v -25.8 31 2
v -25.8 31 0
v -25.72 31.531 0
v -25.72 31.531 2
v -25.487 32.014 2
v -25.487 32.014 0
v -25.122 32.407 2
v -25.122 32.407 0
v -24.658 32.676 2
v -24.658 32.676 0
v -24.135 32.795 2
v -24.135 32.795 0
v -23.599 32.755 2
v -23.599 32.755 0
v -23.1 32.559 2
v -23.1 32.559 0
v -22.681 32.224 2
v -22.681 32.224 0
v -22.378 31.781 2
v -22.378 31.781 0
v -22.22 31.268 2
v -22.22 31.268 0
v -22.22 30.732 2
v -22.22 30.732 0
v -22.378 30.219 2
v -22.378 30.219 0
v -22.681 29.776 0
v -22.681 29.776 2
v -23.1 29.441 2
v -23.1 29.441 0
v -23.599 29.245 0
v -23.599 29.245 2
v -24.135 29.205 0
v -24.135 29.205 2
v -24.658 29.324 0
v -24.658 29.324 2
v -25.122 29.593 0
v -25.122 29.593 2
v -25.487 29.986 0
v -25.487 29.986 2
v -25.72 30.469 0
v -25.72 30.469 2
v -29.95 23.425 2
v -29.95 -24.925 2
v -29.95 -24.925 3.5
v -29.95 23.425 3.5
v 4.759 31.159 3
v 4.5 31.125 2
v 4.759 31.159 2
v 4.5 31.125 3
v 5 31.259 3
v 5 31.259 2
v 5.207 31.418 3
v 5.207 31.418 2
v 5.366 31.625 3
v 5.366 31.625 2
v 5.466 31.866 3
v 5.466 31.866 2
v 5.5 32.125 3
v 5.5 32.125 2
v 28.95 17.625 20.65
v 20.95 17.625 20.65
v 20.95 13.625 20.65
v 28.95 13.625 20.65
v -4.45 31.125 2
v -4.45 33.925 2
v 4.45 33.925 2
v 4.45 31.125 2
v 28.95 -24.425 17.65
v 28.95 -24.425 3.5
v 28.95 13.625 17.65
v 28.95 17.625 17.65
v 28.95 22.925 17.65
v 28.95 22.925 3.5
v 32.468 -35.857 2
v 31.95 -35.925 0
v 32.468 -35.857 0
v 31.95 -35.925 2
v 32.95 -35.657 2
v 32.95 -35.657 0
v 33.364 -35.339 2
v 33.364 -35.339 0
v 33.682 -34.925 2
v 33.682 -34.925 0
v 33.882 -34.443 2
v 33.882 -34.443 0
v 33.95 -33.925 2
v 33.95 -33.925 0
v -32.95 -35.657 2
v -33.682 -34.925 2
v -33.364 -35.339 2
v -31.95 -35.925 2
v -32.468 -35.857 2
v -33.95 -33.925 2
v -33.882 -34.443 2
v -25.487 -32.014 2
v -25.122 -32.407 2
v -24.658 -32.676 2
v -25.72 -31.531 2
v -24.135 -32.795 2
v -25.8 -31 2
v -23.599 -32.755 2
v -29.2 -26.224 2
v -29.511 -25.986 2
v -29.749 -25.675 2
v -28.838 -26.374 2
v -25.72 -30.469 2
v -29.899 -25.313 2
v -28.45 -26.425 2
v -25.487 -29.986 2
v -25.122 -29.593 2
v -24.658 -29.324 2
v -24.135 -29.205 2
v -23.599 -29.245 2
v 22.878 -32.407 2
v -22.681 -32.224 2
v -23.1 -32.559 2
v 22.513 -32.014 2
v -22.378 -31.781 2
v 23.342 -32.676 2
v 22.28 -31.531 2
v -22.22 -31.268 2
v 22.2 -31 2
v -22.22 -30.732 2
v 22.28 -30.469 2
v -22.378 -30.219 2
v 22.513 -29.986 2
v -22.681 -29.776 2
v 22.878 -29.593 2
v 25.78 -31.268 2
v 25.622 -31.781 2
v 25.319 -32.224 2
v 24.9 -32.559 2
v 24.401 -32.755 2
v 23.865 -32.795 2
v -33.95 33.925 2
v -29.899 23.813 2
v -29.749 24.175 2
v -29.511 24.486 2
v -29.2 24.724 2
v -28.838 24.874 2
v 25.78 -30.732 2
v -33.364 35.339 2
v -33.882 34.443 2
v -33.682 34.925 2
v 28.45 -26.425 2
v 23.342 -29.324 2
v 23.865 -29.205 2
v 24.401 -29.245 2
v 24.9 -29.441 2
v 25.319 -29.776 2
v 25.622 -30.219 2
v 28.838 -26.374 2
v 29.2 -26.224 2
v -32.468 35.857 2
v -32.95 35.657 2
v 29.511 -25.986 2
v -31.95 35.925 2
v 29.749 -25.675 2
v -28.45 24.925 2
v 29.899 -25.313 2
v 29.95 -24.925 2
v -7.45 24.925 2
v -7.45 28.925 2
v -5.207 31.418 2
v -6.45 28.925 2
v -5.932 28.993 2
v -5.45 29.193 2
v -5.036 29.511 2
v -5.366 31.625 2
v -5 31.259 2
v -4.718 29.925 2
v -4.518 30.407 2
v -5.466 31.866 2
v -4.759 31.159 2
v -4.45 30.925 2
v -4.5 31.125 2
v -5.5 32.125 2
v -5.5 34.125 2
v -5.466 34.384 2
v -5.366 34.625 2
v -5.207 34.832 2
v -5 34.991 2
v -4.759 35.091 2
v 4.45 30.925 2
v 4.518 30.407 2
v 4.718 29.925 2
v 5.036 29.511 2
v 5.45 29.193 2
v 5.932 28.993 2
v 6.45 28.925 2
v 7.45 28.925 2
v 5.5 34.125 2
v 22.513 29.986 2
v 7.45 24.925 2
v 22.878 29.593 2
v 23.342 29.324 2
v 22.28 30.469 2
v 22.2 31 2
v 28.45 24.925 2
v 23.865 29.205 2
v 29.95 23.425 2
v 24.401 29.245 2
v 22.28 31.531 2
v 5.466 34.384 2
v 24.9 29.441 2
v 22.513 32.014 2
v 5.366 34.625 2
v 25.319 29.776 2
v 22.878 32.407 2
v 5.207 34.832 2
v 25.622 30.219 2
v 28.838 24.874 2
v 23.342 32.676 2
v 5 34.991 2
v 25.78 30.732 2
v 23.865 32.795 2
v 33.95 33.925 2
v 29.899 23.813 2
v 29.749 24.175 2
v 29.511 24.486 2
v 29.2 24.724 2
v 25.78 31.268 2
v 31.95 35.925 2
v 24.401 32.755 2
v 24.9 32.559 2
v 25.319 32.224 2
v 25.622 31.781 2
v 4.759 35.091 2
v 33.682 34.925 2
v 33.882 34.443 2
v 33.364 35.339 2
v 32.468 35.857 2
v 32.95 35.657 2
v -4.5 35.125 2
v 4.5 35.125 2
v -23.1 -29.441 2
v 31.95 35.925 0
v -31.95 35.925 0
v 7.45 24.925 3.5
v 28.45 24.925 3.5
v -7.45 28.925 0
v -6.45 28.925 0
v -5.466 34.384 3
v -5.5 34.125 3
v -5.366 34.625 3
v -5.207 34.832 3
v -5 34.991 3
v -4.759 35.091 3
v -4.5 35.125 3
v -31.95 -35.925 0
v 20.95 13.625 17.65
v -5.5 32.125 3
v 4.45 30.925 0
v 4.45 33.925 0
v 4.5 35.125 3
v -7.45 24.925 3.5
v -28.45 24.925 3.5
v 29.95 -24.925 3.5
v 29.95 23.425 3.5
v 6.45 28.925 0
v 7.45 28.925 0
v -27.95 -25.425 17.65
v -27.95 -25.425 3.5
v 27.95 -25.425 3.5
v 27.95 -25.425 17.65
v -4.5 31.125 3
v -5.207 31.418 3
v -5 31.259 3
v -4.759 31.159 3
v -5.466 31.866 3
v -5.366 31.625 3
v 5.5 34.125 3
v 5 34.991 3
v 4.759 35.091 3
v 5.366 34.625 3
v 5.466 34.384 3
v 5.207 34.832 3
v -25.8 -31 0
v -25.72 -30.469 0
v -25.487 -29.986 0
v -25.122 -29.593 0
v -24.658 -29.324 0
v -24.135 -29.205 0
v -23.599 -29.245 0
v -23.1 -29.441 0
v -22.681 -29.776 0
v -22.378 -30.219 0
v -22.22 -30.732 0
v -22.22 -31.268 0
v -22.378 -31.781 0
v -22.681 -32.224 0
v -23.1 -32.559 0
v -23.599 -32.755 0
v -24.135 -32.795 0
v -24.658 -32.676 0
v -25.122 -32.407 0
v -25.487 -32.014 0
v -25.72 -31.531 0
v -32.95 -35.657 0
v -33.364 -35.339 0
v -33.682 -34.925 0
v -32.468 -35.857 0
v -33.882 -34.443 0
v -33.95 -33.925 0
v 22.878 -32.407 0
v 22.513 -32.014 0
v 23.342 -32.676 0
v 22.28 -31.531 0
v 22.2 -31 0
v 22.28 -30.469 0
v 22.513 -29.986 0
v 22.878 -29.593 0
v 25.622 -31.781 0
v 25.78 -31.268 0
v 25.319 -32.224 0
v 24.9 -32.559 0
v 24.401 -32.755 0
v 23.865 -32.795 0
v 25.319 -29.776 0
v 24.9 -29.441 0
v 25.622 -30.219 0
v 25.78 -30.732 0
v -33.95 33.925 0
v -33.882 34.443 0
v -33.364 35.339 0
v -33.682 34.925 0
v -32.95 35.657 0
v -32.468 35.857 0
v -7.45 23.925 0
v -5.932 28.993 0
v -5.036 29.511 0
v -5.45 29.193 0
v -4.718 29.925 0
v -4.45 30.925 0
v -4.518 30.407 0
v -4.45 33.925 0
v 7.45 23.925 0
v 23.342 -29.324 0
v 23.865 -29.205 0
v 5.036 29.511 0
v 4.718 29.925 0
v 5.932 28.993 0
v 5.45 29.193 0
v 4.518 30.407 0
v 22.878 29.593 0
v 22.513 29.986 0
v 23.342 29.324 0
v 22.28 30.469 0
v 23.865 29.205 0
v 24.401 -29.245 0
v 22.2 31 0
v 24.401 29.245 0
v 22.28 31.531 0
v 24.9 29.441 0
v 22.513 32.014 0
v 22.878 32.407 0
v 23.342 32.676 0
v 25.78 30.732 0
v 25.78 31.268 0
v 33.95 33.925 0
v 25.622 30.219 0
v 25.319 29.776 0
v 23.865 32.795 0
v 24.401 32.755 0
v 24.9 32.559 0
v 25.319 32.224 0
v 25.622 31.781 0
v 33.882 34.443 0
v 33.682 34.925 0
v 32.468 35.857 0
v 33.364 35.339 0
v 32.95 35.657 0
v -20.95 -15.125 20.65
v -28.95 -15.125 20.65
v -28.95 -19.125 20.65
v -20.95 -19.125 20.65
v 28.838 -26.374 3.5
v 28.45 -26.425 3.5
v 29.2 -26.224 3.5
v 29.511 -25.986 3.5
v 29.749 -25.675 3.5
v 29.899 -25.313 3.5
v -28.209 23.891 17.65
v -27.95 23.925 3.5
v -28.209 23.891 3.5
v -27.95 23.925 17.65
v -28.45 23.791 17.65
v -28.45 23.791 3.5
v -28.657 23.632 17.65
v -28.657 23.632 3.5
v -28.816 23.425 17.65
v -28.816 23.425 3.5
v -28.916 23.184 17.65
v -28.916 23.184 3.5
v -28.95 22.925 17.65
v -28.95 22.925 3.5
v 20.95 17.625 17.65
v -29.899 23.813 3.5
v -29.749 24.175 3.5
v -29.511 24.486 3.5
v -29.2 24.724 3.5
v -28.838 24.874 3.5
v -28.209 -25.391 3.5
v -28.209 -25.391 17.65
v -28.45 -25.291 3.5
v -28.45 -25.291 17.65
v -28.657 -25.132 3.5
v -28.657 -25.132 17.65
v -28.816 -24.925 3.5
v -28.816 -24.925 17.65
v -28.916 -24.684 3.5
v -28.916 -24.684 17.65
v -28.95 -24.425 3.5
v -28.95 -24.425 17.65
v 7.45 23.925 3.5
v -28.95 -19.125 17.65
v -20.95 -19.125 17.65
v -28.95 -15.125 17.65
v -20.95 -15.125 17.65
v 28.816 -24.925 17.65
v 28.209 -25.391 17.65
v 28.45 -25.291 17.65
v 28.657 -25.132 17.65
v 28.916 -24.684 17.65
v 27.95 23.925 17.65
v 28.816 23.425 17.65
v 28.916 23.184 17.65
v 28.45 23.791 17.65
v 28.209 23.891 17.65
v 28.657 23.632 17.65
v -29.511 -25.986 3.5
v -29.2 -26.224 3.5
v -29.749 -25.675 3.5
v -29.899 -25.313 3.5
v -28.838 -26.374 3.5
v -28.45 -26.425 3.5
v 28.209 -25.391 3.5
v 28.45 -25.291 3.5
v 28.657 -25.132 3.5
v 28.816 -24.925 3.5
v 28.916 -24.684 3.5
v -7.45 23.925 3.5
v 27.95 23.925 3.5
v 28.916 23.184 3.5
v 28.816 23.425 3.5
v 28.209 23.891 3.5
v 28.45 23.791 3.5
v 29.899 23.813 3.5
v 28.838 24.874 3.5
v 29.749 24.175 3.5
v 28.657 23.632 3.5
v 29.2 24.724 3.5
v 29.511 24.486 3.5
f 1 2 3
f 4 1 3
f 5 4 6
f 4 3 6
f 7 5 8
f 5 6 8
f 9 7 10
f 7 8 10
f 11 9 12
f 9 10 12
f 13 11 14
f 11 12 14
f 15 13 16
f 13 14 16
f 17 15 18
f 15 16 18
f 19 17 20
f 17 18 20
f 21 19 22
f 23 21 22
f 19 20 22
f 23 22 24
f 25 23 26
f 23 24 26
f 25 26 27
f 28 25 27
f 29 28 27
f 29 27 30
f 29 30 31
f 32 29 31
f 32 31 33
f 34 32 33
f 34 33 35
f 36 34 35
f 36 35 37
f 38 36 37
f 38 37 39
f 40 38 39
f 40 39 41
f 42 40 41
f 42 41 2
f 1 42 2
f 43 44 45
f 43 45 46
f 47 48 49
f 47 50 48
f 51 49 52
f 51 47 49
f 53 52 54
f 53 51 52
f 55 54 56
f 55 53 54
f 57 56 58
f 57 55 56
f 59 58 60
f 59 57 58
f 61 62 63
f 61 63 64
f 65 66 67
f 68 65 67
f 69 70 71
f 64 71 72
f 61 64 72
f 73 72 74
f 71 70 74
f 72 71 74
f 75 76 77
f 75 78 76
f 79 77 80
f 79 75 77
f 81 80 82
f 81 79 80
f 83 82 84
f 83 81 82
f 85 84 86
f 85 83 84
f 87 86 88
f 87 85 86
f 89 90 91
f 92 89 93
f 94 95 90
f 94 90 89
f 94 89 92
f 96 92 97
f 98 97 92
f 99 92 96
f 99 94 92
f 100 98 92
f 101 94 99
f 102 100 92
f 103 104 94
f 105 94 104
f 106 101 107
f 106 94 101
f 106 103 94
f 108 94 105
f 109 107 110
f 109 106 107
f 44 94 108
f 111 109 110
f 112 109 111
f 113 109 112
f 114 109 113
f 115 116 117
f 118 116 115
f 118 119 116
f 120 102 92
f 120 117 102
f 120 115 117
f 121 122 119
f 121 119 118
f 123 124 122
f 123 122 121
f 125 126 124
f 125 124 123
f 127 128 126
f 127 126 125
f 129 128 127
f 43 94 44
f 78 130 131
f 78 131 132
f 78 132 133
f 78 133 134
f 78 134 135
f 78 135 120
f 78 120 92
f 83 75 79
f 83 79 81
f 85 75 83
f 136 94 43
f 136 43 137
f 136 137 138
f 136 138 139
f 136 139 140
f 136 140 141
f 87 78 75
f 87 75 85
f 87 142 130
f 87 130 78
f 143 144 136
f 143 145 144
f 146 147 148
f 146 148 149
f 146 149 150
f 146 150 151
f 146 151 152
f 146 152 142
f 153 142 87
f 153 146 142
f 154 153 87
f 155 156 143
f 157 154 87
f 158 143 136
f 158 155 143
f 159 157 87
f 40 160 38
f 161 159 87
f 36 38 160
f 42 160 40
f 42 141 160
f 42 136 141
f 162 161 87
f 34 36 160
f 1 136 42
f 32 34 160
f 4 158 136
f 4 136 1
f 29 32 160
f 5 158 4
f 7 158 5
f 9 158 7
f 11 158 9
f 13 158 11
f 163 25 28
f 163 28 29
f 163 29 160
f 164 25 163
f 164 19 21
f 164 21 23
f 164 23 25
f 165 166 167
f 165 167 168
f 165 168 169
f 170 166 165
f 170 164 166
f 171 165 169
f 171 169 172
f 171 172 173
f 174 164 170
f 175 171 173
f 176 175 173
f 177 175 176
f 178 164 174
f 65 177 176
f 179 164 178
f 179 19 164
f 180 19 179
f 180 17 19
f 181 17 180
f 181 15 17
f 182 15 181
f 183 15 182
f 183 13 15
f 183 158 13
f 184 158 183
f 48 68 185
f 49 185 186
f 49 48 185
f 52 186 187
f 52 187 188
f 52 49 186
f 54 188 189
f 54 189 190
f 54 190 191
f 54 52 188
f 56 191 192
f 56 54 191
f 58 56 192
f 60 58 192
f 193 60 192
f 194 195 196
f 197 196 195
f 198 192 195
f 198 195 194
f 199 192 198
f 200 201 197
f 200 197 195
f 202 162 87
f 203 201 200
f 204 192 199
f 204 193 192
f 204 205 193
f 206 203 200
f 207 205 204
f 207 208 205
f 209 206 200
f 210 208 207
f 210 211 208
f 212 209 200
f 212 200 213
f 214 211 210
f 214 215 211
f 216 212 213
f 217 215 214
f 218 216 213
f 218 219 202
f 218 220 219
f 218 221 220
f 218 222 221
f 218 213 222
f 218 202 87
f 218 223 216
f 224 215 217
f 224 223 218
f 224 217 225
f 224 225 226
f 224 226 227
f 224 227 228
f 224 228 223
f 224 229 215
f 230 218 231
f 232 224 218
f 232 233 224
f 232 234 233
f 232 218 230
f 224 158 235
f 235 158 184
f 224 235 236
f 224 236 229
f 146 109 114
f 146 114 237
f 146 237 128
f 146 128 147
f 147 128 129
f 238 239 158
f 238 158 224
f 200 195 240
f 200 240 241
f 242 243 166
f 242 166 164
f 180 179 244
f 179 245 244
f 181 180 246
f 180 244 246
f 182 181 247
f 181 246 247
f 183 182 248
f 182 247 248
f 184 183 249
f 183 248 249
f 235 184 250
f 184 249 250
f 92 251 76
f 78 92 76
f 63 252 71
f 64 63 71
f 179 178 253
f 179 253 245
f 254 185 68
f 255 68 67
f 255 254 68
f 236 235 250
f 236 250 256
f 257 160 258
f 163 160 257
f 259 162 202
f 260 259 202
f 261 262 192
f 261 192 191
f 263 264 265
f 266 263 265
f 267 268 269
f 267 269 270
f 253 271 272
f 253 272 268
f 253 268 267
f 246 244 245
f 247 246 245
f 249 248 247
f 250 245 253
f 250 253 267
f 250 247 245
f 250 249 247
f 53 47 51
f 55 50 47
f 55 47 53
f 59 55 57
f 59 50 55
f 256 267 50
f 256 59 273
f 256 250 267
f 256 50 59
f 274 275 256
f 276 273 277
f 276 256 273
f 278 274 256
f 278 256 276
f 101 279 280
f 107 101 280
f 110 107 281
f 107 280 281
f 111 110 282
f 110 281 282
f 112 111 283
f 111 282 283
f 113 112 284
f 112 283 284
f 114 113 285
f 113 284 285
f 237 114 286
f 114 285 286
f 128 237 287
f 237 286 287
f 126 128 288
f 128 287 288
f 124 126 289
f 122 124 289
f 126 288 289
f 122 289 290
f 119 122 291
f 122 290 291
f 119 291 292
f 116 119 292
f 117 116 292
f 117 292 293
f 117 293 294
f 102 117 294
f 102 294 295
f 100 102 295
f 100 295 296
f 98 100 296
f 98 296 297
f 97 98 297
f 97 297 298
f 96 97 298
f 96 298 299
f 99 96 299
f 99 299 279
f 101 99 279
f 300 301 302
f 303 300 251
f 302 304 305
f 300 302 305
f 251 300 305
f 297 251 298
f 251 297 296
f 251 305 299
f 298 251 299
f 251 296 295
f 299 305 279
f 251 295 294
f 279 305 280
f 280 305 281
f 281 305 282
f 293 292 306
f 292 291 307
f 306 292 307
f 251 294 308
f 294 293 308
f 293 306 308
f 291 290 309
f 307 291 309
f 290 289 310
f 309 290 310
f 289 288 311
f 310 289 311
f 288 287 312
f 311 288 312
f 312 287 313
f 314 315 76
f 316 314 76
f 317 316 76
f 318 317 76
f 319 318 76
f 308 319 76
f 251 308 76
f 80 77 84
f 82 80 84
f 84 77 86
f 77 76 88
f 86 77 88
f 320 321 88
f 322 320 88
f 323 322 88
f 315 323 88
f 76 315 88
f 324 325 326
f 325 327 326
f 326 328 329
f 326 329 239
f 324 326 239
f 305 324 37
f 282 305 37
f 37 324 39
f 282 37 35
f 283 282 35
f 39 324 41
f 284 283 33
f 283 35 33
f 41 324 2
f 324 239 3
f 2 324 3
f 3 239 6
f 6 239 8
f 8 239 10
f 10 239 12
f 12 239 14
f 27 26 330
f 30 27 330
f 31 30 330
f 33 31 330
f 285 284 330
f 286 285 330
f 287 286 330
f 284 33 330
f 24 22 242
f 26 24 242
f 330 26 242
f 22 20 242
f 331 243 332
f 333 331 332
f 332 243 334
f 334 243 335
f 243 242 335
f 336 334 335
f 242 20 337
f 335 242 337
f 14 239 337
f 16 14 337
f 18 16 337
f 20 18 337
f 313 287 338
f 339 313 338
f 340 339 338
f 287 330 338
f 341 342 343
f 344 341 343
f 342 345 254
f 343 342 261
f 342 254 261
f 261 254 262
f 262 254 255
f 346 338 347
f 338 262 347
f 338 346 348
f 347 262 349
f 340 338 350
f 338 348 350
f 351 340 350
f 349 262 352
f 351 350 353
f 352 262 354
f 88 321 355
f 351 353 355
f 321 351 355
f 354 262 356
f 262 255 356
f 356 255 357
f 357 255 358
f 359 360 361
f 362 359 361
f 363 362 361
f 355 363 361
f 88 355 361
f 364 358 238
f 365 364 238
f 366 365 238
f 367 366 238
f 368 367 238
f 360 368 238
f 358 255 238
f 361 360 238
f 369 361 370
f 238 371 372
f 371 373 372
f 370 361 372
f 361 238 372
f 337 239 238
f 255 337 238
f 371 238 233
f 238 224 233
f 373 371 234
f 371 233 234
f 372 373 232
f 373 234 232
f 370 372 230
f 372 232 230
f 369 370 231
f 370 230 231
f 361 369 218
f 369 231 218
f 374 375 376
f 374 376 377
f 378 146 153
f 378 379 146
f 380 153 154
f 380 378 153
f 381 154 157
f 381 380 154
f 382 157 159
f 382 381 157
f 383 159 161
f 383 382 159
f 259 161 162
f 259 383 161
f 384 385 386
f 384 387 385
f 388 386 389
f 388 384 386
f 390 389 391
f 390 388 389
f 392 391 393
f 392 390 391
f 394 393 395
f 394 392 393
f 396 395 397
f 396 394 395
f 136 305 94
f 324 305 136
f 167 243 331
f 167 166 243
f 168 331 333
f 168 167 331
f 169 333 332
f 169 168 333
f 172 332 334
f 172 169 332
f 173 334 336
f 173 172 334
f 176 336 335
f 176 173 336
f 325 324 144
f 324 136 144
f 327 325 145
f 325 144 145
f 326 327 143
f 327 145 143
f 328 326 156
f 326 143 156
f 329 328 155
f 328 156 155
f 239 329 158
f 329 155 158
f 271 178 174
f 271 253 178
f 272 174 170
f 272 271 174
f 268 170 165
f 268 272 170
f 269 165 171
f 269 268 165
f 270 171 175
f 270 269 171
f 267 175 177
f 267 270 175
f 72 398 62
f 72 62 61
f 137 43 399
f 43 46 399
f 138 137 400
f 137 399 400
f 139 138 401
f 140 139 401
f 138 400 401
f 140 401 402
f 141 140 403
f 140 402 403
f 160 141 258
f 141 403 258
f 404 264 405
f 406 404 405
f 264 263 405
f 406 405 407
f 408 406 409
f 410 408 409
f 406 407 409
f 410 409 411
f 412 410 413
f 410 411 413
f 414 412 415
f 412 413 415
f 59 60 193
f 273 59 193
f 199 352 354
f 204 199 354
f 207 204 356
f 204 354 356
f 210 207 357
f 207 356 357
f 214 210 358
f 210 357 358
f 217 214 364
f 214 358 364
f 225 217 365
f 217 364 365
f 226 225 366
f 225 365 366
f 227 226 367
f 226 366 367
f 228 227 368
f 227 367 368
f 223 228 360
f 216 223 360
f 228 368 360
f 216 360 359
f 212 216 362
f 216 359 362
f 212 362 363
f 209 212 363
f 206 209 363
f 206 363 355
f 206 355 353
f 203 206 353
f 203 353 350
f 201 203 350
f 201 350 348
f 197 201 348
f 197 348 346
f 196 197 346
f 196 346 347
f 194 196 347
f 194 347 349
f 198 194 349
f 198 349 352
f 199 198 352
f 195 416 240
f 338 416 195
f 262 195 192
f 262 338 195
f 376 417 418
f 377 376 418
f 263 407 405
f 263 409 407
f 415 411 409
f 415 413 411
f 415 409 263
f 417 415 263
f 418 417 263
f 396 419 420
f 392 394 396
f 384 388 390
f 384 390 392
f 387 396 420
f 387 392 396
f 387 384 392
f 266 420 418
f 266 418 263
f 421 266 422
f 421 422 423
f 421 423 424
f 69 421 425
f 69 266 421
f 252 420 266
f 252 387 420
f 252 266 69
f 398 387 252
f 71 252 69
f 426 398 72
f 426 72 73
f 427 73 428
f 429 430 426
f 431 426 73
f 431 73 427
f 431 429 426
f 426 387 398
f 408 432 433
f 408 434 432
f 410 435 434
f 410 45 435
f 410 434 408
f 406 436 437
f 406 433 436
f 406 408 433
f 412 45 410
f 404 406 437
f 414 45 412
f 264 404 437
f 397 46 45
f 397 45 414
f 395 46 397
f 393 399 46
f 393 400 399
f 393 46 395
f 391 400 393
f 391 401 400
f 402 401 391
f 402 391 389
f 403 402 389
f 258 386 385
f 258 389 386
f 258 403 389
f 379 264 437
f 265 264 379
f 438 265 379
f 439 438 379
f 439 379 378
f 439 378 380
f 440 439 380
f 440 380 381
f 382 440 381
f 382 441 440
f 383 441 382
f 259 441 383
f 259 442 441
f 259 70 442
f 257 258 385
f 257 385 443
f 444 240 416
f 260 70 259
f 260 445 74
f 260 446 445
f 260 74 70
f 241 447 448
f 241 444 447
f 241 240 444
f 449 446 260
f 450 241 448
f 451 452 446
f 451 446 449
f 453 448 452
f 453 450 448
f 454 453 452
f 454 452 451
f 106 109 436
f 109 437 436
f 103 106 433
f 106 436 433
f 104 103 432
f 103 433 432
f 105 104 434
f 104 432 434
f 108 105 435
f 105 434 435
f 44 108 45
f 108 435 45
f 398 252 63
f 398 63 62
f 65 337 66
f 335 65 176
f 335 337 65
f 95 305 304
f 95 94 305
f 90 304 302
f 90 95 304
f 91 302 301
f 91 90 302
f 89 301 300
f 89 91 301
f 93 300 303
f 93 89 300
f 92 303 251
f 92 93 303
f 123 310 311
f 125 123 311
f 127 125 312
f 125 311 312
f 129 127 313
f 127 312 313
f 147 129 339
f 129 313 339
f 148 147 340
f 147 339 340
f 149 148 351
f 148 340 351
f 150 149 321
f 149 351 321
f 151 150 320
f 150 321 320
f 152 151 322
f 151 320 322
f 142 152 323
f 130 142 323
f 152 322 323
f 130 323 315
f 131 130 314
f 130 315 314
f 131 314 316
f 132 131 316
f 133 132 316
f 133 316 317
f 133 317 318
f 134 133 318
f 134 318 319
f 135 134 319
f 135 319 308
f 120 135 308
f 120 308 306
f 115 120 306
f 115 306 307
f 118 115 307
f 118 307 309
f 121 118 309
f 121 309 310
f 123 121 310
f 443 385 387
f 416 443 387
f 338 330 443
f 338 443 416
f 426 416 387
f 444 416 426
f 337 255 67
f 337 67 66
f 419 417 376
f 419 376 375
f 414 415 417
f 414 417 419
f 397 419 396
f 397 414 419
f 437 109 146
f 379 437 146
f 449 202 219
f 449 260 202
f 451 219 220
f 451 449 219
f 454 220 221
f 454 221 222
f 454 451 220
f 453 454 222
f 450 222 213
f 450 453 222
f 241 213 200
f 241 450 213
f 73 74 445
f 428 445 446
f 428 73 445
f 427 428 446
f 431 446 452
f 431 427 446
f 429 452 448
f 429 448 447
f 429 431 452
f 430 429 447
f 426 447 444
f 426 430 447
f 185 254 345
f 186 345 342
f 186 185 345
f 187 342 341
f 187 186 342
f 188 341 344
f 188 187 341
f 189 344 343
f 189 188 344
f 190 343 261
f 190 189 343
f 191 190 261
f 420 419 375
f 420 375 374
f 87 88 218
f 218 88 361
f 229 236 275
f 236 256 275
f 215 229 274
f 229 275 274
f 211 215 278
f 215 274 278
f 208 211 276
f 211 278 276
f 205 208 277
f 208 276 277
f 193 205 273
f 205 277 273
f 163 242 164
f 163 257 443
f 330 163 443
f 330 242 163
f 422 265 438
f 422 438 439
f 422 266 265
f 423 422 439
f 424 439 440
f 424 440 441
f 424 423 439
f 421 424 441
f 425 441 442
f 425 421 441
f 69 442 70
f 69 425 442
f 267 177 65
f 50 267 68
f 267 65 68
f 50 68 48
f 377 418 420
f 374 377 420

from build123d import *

# Parameters (mm, degrees)
SKETCH_1_W          = 67.9
SKETCH_1_H          = 71.85
EXTRUDE_1_DEPTH     = 2
SKETCH_2_W          = 59.9
SKETCH_2_H          = 51.35
EXTRUDE_2_DEPTH     = 1.5
SKETCH_3_W          = 57.9
SKETCH_3_H          = 49.35
EXTRUDE_3_DEPTH     = 14.15
SKETCH_4_R          = 1.8
CUT_EXTRUDE_1_DEPTH = 53.485527767
FILLET_1_R          = 2
FILLET_2_R          = 1.5
FILLET_3_R          = 1
CUT_EXTRUDE_2_DEPTH = 53.485527767
FILLET_4_R          = 2
SKETCH_7_W          = 11
SKETCH_7_H          = 4
EXTRUDE_4_DEPTH     = 1
FILLET_5_R          = 1
SKETCH_8_W          = 8
SKETCH_8_H          = 4
EXTRUDE_5_DEPTH     = 3


with BuildPart() as part:
    # 草图1 → 凸台-拉伸1 (new body)
    with BuildSketch(Plane.XY):
        Rectangle(SKETCH_1_W, SKETCH_1_H)
    extrude(amount=EXTRUDE_1_DEPTH)

    # 草图2 → 凸台-拉伸2 (add)
    with BuildSketch(Plane.XY.offset(2)):
        with Locations((0, -0.75)):
            Rectangle(SKETCH_2_W, SKETCH_2_H)
    extrude(amount=EXTRUDE_2_DEPTH)

    # 草图3 → 凸台-拉伸3 (add)
    with BuildSketch(Plane.XY.offset(3.5)):
        with Locations((0, -0.75)):
            Rectangle(SKETCH_3_W, SKETCH_3_H)
    extrude(amount=EXTRUDE_3_DEPTH)

    # 草图4 → 切除-拉伸1 (cut, through all)
    with BuildSketch(Plane(origin=(0, 0, 0), x_dir=(-1, 0, 0), z_dir=(0, 0, -1))):
        with Locations((24, 31)):
            Circle(SKETCH_4_R)
        with Locations((-24, 31)):
            Circle(SKETCH_4_R)
        with Locations((-24, -31)):
            Circle(SKETCH_4_R)
        with Locations((24, -31)):
            Circle(SKETCH_4_R)
    extrude(amount=-CUT_EXTRUDE_1_DEPTH, mode=Mode.SUBTRACT)

    # 圆角1
    fillet_1_edges = [part.edges().sort_by_distance(p)[0] for p in [
        (33.95, -35.925, 1),
        (-33.95, -35.925, 1),
        (-33.95, 35.925, 1),
        (33.95, 35.925, 1),
    ]]
    fillet(fillet_1_edges, radius=FILLET_1_R)

    # 圆角2
    fillet_2_edges = [part.edges().sort_by_distance(p)[0] for p in [
        (-29.95, 24.925, 2.75),
        (-29.95, -26.425, 2.75),
        (29.95, -26.425, 2.75),
        (29.95, 24.925, 2.75),
    ]]
    fillet(fillet_2_edges, radius=FILLET_2_R)

    # 圆角3
    fillet_3_edges = [part.edges().sort_by_distance(p)[0] for p in [
        (-28.95, 23.925, 10.575),
        (-28.95, -25.425, 10.575),
        (28.95, -25.425, 10.575),
        (28.95, 23.925, 10.575),
    ]]
    fillet(fillet_3_edges, radius=FILLET_3_R)

    # 草图6 → 切除-拉伸2 (cut, through all)
    with BuildSketch(Plane(origin=(0, 0, 0), x_dir=(-1, 0, 0), z_dir=(0, 0, -1))):
        Polygon((-4.45, 33.925), (4.45, 33.925), (4.45, 28.925), (7.45, 28.925), (7.45, 23.925), (-7.45, 23.925), (-7.45, 28.925), (-4.45, 28.925), align=None)
    extrude(amount=-CUT_EXTRUDE_2_DEPTH, mode=Mode.SUBTRACT)

    # 圆角4
    fillet_4_edges = [part.edges().sort_by_distance(p)[0] for p in [
        (4.45, 28.925, 1),
        (-4.45, 28.925, 1),
    ]]
    fillet(fillet_4_edges, radius=FILLET_4_R)

    # 草图7 → 凸台-拉伸4 (add)
    with BuildSketch(Plane.XY.offset(2)):
        with Locations((0, 33.125)):
            Rectangle(SKETCH_7_W, SKETCH_7_H)
    extrude(amount=EXTRUDE_4_DEPTH)

    # 圆角5
    fillet_5_edges = [part.edges().sort_by_distance(p)[0] for p in [
        (-5.5, 35.125, 2.5),
        (-5.5, 31.125, 2.5),
        (5.5, 31.125, 2.5),
        (5.5, 35.125, 2.5),
    ]]
    fillet(fillet_5_edges, radius=FILLET_5_R)

    # 草图8 → 凸台-拉伸5 (add)
    with BuildSketch(Plane.XY.offset(17.65)):
        with Locations((24.95, 15.625)):
            Rectangle(SKETCH_8_W, SKETCH_8_H)
        with Locations((-24.95, -17.125)):
            Rectangle(SKETCH_8_W, SKETCH_8_H)
    extrude(amount=EXTRUDE_5_DEPTH)


solid = part.part
